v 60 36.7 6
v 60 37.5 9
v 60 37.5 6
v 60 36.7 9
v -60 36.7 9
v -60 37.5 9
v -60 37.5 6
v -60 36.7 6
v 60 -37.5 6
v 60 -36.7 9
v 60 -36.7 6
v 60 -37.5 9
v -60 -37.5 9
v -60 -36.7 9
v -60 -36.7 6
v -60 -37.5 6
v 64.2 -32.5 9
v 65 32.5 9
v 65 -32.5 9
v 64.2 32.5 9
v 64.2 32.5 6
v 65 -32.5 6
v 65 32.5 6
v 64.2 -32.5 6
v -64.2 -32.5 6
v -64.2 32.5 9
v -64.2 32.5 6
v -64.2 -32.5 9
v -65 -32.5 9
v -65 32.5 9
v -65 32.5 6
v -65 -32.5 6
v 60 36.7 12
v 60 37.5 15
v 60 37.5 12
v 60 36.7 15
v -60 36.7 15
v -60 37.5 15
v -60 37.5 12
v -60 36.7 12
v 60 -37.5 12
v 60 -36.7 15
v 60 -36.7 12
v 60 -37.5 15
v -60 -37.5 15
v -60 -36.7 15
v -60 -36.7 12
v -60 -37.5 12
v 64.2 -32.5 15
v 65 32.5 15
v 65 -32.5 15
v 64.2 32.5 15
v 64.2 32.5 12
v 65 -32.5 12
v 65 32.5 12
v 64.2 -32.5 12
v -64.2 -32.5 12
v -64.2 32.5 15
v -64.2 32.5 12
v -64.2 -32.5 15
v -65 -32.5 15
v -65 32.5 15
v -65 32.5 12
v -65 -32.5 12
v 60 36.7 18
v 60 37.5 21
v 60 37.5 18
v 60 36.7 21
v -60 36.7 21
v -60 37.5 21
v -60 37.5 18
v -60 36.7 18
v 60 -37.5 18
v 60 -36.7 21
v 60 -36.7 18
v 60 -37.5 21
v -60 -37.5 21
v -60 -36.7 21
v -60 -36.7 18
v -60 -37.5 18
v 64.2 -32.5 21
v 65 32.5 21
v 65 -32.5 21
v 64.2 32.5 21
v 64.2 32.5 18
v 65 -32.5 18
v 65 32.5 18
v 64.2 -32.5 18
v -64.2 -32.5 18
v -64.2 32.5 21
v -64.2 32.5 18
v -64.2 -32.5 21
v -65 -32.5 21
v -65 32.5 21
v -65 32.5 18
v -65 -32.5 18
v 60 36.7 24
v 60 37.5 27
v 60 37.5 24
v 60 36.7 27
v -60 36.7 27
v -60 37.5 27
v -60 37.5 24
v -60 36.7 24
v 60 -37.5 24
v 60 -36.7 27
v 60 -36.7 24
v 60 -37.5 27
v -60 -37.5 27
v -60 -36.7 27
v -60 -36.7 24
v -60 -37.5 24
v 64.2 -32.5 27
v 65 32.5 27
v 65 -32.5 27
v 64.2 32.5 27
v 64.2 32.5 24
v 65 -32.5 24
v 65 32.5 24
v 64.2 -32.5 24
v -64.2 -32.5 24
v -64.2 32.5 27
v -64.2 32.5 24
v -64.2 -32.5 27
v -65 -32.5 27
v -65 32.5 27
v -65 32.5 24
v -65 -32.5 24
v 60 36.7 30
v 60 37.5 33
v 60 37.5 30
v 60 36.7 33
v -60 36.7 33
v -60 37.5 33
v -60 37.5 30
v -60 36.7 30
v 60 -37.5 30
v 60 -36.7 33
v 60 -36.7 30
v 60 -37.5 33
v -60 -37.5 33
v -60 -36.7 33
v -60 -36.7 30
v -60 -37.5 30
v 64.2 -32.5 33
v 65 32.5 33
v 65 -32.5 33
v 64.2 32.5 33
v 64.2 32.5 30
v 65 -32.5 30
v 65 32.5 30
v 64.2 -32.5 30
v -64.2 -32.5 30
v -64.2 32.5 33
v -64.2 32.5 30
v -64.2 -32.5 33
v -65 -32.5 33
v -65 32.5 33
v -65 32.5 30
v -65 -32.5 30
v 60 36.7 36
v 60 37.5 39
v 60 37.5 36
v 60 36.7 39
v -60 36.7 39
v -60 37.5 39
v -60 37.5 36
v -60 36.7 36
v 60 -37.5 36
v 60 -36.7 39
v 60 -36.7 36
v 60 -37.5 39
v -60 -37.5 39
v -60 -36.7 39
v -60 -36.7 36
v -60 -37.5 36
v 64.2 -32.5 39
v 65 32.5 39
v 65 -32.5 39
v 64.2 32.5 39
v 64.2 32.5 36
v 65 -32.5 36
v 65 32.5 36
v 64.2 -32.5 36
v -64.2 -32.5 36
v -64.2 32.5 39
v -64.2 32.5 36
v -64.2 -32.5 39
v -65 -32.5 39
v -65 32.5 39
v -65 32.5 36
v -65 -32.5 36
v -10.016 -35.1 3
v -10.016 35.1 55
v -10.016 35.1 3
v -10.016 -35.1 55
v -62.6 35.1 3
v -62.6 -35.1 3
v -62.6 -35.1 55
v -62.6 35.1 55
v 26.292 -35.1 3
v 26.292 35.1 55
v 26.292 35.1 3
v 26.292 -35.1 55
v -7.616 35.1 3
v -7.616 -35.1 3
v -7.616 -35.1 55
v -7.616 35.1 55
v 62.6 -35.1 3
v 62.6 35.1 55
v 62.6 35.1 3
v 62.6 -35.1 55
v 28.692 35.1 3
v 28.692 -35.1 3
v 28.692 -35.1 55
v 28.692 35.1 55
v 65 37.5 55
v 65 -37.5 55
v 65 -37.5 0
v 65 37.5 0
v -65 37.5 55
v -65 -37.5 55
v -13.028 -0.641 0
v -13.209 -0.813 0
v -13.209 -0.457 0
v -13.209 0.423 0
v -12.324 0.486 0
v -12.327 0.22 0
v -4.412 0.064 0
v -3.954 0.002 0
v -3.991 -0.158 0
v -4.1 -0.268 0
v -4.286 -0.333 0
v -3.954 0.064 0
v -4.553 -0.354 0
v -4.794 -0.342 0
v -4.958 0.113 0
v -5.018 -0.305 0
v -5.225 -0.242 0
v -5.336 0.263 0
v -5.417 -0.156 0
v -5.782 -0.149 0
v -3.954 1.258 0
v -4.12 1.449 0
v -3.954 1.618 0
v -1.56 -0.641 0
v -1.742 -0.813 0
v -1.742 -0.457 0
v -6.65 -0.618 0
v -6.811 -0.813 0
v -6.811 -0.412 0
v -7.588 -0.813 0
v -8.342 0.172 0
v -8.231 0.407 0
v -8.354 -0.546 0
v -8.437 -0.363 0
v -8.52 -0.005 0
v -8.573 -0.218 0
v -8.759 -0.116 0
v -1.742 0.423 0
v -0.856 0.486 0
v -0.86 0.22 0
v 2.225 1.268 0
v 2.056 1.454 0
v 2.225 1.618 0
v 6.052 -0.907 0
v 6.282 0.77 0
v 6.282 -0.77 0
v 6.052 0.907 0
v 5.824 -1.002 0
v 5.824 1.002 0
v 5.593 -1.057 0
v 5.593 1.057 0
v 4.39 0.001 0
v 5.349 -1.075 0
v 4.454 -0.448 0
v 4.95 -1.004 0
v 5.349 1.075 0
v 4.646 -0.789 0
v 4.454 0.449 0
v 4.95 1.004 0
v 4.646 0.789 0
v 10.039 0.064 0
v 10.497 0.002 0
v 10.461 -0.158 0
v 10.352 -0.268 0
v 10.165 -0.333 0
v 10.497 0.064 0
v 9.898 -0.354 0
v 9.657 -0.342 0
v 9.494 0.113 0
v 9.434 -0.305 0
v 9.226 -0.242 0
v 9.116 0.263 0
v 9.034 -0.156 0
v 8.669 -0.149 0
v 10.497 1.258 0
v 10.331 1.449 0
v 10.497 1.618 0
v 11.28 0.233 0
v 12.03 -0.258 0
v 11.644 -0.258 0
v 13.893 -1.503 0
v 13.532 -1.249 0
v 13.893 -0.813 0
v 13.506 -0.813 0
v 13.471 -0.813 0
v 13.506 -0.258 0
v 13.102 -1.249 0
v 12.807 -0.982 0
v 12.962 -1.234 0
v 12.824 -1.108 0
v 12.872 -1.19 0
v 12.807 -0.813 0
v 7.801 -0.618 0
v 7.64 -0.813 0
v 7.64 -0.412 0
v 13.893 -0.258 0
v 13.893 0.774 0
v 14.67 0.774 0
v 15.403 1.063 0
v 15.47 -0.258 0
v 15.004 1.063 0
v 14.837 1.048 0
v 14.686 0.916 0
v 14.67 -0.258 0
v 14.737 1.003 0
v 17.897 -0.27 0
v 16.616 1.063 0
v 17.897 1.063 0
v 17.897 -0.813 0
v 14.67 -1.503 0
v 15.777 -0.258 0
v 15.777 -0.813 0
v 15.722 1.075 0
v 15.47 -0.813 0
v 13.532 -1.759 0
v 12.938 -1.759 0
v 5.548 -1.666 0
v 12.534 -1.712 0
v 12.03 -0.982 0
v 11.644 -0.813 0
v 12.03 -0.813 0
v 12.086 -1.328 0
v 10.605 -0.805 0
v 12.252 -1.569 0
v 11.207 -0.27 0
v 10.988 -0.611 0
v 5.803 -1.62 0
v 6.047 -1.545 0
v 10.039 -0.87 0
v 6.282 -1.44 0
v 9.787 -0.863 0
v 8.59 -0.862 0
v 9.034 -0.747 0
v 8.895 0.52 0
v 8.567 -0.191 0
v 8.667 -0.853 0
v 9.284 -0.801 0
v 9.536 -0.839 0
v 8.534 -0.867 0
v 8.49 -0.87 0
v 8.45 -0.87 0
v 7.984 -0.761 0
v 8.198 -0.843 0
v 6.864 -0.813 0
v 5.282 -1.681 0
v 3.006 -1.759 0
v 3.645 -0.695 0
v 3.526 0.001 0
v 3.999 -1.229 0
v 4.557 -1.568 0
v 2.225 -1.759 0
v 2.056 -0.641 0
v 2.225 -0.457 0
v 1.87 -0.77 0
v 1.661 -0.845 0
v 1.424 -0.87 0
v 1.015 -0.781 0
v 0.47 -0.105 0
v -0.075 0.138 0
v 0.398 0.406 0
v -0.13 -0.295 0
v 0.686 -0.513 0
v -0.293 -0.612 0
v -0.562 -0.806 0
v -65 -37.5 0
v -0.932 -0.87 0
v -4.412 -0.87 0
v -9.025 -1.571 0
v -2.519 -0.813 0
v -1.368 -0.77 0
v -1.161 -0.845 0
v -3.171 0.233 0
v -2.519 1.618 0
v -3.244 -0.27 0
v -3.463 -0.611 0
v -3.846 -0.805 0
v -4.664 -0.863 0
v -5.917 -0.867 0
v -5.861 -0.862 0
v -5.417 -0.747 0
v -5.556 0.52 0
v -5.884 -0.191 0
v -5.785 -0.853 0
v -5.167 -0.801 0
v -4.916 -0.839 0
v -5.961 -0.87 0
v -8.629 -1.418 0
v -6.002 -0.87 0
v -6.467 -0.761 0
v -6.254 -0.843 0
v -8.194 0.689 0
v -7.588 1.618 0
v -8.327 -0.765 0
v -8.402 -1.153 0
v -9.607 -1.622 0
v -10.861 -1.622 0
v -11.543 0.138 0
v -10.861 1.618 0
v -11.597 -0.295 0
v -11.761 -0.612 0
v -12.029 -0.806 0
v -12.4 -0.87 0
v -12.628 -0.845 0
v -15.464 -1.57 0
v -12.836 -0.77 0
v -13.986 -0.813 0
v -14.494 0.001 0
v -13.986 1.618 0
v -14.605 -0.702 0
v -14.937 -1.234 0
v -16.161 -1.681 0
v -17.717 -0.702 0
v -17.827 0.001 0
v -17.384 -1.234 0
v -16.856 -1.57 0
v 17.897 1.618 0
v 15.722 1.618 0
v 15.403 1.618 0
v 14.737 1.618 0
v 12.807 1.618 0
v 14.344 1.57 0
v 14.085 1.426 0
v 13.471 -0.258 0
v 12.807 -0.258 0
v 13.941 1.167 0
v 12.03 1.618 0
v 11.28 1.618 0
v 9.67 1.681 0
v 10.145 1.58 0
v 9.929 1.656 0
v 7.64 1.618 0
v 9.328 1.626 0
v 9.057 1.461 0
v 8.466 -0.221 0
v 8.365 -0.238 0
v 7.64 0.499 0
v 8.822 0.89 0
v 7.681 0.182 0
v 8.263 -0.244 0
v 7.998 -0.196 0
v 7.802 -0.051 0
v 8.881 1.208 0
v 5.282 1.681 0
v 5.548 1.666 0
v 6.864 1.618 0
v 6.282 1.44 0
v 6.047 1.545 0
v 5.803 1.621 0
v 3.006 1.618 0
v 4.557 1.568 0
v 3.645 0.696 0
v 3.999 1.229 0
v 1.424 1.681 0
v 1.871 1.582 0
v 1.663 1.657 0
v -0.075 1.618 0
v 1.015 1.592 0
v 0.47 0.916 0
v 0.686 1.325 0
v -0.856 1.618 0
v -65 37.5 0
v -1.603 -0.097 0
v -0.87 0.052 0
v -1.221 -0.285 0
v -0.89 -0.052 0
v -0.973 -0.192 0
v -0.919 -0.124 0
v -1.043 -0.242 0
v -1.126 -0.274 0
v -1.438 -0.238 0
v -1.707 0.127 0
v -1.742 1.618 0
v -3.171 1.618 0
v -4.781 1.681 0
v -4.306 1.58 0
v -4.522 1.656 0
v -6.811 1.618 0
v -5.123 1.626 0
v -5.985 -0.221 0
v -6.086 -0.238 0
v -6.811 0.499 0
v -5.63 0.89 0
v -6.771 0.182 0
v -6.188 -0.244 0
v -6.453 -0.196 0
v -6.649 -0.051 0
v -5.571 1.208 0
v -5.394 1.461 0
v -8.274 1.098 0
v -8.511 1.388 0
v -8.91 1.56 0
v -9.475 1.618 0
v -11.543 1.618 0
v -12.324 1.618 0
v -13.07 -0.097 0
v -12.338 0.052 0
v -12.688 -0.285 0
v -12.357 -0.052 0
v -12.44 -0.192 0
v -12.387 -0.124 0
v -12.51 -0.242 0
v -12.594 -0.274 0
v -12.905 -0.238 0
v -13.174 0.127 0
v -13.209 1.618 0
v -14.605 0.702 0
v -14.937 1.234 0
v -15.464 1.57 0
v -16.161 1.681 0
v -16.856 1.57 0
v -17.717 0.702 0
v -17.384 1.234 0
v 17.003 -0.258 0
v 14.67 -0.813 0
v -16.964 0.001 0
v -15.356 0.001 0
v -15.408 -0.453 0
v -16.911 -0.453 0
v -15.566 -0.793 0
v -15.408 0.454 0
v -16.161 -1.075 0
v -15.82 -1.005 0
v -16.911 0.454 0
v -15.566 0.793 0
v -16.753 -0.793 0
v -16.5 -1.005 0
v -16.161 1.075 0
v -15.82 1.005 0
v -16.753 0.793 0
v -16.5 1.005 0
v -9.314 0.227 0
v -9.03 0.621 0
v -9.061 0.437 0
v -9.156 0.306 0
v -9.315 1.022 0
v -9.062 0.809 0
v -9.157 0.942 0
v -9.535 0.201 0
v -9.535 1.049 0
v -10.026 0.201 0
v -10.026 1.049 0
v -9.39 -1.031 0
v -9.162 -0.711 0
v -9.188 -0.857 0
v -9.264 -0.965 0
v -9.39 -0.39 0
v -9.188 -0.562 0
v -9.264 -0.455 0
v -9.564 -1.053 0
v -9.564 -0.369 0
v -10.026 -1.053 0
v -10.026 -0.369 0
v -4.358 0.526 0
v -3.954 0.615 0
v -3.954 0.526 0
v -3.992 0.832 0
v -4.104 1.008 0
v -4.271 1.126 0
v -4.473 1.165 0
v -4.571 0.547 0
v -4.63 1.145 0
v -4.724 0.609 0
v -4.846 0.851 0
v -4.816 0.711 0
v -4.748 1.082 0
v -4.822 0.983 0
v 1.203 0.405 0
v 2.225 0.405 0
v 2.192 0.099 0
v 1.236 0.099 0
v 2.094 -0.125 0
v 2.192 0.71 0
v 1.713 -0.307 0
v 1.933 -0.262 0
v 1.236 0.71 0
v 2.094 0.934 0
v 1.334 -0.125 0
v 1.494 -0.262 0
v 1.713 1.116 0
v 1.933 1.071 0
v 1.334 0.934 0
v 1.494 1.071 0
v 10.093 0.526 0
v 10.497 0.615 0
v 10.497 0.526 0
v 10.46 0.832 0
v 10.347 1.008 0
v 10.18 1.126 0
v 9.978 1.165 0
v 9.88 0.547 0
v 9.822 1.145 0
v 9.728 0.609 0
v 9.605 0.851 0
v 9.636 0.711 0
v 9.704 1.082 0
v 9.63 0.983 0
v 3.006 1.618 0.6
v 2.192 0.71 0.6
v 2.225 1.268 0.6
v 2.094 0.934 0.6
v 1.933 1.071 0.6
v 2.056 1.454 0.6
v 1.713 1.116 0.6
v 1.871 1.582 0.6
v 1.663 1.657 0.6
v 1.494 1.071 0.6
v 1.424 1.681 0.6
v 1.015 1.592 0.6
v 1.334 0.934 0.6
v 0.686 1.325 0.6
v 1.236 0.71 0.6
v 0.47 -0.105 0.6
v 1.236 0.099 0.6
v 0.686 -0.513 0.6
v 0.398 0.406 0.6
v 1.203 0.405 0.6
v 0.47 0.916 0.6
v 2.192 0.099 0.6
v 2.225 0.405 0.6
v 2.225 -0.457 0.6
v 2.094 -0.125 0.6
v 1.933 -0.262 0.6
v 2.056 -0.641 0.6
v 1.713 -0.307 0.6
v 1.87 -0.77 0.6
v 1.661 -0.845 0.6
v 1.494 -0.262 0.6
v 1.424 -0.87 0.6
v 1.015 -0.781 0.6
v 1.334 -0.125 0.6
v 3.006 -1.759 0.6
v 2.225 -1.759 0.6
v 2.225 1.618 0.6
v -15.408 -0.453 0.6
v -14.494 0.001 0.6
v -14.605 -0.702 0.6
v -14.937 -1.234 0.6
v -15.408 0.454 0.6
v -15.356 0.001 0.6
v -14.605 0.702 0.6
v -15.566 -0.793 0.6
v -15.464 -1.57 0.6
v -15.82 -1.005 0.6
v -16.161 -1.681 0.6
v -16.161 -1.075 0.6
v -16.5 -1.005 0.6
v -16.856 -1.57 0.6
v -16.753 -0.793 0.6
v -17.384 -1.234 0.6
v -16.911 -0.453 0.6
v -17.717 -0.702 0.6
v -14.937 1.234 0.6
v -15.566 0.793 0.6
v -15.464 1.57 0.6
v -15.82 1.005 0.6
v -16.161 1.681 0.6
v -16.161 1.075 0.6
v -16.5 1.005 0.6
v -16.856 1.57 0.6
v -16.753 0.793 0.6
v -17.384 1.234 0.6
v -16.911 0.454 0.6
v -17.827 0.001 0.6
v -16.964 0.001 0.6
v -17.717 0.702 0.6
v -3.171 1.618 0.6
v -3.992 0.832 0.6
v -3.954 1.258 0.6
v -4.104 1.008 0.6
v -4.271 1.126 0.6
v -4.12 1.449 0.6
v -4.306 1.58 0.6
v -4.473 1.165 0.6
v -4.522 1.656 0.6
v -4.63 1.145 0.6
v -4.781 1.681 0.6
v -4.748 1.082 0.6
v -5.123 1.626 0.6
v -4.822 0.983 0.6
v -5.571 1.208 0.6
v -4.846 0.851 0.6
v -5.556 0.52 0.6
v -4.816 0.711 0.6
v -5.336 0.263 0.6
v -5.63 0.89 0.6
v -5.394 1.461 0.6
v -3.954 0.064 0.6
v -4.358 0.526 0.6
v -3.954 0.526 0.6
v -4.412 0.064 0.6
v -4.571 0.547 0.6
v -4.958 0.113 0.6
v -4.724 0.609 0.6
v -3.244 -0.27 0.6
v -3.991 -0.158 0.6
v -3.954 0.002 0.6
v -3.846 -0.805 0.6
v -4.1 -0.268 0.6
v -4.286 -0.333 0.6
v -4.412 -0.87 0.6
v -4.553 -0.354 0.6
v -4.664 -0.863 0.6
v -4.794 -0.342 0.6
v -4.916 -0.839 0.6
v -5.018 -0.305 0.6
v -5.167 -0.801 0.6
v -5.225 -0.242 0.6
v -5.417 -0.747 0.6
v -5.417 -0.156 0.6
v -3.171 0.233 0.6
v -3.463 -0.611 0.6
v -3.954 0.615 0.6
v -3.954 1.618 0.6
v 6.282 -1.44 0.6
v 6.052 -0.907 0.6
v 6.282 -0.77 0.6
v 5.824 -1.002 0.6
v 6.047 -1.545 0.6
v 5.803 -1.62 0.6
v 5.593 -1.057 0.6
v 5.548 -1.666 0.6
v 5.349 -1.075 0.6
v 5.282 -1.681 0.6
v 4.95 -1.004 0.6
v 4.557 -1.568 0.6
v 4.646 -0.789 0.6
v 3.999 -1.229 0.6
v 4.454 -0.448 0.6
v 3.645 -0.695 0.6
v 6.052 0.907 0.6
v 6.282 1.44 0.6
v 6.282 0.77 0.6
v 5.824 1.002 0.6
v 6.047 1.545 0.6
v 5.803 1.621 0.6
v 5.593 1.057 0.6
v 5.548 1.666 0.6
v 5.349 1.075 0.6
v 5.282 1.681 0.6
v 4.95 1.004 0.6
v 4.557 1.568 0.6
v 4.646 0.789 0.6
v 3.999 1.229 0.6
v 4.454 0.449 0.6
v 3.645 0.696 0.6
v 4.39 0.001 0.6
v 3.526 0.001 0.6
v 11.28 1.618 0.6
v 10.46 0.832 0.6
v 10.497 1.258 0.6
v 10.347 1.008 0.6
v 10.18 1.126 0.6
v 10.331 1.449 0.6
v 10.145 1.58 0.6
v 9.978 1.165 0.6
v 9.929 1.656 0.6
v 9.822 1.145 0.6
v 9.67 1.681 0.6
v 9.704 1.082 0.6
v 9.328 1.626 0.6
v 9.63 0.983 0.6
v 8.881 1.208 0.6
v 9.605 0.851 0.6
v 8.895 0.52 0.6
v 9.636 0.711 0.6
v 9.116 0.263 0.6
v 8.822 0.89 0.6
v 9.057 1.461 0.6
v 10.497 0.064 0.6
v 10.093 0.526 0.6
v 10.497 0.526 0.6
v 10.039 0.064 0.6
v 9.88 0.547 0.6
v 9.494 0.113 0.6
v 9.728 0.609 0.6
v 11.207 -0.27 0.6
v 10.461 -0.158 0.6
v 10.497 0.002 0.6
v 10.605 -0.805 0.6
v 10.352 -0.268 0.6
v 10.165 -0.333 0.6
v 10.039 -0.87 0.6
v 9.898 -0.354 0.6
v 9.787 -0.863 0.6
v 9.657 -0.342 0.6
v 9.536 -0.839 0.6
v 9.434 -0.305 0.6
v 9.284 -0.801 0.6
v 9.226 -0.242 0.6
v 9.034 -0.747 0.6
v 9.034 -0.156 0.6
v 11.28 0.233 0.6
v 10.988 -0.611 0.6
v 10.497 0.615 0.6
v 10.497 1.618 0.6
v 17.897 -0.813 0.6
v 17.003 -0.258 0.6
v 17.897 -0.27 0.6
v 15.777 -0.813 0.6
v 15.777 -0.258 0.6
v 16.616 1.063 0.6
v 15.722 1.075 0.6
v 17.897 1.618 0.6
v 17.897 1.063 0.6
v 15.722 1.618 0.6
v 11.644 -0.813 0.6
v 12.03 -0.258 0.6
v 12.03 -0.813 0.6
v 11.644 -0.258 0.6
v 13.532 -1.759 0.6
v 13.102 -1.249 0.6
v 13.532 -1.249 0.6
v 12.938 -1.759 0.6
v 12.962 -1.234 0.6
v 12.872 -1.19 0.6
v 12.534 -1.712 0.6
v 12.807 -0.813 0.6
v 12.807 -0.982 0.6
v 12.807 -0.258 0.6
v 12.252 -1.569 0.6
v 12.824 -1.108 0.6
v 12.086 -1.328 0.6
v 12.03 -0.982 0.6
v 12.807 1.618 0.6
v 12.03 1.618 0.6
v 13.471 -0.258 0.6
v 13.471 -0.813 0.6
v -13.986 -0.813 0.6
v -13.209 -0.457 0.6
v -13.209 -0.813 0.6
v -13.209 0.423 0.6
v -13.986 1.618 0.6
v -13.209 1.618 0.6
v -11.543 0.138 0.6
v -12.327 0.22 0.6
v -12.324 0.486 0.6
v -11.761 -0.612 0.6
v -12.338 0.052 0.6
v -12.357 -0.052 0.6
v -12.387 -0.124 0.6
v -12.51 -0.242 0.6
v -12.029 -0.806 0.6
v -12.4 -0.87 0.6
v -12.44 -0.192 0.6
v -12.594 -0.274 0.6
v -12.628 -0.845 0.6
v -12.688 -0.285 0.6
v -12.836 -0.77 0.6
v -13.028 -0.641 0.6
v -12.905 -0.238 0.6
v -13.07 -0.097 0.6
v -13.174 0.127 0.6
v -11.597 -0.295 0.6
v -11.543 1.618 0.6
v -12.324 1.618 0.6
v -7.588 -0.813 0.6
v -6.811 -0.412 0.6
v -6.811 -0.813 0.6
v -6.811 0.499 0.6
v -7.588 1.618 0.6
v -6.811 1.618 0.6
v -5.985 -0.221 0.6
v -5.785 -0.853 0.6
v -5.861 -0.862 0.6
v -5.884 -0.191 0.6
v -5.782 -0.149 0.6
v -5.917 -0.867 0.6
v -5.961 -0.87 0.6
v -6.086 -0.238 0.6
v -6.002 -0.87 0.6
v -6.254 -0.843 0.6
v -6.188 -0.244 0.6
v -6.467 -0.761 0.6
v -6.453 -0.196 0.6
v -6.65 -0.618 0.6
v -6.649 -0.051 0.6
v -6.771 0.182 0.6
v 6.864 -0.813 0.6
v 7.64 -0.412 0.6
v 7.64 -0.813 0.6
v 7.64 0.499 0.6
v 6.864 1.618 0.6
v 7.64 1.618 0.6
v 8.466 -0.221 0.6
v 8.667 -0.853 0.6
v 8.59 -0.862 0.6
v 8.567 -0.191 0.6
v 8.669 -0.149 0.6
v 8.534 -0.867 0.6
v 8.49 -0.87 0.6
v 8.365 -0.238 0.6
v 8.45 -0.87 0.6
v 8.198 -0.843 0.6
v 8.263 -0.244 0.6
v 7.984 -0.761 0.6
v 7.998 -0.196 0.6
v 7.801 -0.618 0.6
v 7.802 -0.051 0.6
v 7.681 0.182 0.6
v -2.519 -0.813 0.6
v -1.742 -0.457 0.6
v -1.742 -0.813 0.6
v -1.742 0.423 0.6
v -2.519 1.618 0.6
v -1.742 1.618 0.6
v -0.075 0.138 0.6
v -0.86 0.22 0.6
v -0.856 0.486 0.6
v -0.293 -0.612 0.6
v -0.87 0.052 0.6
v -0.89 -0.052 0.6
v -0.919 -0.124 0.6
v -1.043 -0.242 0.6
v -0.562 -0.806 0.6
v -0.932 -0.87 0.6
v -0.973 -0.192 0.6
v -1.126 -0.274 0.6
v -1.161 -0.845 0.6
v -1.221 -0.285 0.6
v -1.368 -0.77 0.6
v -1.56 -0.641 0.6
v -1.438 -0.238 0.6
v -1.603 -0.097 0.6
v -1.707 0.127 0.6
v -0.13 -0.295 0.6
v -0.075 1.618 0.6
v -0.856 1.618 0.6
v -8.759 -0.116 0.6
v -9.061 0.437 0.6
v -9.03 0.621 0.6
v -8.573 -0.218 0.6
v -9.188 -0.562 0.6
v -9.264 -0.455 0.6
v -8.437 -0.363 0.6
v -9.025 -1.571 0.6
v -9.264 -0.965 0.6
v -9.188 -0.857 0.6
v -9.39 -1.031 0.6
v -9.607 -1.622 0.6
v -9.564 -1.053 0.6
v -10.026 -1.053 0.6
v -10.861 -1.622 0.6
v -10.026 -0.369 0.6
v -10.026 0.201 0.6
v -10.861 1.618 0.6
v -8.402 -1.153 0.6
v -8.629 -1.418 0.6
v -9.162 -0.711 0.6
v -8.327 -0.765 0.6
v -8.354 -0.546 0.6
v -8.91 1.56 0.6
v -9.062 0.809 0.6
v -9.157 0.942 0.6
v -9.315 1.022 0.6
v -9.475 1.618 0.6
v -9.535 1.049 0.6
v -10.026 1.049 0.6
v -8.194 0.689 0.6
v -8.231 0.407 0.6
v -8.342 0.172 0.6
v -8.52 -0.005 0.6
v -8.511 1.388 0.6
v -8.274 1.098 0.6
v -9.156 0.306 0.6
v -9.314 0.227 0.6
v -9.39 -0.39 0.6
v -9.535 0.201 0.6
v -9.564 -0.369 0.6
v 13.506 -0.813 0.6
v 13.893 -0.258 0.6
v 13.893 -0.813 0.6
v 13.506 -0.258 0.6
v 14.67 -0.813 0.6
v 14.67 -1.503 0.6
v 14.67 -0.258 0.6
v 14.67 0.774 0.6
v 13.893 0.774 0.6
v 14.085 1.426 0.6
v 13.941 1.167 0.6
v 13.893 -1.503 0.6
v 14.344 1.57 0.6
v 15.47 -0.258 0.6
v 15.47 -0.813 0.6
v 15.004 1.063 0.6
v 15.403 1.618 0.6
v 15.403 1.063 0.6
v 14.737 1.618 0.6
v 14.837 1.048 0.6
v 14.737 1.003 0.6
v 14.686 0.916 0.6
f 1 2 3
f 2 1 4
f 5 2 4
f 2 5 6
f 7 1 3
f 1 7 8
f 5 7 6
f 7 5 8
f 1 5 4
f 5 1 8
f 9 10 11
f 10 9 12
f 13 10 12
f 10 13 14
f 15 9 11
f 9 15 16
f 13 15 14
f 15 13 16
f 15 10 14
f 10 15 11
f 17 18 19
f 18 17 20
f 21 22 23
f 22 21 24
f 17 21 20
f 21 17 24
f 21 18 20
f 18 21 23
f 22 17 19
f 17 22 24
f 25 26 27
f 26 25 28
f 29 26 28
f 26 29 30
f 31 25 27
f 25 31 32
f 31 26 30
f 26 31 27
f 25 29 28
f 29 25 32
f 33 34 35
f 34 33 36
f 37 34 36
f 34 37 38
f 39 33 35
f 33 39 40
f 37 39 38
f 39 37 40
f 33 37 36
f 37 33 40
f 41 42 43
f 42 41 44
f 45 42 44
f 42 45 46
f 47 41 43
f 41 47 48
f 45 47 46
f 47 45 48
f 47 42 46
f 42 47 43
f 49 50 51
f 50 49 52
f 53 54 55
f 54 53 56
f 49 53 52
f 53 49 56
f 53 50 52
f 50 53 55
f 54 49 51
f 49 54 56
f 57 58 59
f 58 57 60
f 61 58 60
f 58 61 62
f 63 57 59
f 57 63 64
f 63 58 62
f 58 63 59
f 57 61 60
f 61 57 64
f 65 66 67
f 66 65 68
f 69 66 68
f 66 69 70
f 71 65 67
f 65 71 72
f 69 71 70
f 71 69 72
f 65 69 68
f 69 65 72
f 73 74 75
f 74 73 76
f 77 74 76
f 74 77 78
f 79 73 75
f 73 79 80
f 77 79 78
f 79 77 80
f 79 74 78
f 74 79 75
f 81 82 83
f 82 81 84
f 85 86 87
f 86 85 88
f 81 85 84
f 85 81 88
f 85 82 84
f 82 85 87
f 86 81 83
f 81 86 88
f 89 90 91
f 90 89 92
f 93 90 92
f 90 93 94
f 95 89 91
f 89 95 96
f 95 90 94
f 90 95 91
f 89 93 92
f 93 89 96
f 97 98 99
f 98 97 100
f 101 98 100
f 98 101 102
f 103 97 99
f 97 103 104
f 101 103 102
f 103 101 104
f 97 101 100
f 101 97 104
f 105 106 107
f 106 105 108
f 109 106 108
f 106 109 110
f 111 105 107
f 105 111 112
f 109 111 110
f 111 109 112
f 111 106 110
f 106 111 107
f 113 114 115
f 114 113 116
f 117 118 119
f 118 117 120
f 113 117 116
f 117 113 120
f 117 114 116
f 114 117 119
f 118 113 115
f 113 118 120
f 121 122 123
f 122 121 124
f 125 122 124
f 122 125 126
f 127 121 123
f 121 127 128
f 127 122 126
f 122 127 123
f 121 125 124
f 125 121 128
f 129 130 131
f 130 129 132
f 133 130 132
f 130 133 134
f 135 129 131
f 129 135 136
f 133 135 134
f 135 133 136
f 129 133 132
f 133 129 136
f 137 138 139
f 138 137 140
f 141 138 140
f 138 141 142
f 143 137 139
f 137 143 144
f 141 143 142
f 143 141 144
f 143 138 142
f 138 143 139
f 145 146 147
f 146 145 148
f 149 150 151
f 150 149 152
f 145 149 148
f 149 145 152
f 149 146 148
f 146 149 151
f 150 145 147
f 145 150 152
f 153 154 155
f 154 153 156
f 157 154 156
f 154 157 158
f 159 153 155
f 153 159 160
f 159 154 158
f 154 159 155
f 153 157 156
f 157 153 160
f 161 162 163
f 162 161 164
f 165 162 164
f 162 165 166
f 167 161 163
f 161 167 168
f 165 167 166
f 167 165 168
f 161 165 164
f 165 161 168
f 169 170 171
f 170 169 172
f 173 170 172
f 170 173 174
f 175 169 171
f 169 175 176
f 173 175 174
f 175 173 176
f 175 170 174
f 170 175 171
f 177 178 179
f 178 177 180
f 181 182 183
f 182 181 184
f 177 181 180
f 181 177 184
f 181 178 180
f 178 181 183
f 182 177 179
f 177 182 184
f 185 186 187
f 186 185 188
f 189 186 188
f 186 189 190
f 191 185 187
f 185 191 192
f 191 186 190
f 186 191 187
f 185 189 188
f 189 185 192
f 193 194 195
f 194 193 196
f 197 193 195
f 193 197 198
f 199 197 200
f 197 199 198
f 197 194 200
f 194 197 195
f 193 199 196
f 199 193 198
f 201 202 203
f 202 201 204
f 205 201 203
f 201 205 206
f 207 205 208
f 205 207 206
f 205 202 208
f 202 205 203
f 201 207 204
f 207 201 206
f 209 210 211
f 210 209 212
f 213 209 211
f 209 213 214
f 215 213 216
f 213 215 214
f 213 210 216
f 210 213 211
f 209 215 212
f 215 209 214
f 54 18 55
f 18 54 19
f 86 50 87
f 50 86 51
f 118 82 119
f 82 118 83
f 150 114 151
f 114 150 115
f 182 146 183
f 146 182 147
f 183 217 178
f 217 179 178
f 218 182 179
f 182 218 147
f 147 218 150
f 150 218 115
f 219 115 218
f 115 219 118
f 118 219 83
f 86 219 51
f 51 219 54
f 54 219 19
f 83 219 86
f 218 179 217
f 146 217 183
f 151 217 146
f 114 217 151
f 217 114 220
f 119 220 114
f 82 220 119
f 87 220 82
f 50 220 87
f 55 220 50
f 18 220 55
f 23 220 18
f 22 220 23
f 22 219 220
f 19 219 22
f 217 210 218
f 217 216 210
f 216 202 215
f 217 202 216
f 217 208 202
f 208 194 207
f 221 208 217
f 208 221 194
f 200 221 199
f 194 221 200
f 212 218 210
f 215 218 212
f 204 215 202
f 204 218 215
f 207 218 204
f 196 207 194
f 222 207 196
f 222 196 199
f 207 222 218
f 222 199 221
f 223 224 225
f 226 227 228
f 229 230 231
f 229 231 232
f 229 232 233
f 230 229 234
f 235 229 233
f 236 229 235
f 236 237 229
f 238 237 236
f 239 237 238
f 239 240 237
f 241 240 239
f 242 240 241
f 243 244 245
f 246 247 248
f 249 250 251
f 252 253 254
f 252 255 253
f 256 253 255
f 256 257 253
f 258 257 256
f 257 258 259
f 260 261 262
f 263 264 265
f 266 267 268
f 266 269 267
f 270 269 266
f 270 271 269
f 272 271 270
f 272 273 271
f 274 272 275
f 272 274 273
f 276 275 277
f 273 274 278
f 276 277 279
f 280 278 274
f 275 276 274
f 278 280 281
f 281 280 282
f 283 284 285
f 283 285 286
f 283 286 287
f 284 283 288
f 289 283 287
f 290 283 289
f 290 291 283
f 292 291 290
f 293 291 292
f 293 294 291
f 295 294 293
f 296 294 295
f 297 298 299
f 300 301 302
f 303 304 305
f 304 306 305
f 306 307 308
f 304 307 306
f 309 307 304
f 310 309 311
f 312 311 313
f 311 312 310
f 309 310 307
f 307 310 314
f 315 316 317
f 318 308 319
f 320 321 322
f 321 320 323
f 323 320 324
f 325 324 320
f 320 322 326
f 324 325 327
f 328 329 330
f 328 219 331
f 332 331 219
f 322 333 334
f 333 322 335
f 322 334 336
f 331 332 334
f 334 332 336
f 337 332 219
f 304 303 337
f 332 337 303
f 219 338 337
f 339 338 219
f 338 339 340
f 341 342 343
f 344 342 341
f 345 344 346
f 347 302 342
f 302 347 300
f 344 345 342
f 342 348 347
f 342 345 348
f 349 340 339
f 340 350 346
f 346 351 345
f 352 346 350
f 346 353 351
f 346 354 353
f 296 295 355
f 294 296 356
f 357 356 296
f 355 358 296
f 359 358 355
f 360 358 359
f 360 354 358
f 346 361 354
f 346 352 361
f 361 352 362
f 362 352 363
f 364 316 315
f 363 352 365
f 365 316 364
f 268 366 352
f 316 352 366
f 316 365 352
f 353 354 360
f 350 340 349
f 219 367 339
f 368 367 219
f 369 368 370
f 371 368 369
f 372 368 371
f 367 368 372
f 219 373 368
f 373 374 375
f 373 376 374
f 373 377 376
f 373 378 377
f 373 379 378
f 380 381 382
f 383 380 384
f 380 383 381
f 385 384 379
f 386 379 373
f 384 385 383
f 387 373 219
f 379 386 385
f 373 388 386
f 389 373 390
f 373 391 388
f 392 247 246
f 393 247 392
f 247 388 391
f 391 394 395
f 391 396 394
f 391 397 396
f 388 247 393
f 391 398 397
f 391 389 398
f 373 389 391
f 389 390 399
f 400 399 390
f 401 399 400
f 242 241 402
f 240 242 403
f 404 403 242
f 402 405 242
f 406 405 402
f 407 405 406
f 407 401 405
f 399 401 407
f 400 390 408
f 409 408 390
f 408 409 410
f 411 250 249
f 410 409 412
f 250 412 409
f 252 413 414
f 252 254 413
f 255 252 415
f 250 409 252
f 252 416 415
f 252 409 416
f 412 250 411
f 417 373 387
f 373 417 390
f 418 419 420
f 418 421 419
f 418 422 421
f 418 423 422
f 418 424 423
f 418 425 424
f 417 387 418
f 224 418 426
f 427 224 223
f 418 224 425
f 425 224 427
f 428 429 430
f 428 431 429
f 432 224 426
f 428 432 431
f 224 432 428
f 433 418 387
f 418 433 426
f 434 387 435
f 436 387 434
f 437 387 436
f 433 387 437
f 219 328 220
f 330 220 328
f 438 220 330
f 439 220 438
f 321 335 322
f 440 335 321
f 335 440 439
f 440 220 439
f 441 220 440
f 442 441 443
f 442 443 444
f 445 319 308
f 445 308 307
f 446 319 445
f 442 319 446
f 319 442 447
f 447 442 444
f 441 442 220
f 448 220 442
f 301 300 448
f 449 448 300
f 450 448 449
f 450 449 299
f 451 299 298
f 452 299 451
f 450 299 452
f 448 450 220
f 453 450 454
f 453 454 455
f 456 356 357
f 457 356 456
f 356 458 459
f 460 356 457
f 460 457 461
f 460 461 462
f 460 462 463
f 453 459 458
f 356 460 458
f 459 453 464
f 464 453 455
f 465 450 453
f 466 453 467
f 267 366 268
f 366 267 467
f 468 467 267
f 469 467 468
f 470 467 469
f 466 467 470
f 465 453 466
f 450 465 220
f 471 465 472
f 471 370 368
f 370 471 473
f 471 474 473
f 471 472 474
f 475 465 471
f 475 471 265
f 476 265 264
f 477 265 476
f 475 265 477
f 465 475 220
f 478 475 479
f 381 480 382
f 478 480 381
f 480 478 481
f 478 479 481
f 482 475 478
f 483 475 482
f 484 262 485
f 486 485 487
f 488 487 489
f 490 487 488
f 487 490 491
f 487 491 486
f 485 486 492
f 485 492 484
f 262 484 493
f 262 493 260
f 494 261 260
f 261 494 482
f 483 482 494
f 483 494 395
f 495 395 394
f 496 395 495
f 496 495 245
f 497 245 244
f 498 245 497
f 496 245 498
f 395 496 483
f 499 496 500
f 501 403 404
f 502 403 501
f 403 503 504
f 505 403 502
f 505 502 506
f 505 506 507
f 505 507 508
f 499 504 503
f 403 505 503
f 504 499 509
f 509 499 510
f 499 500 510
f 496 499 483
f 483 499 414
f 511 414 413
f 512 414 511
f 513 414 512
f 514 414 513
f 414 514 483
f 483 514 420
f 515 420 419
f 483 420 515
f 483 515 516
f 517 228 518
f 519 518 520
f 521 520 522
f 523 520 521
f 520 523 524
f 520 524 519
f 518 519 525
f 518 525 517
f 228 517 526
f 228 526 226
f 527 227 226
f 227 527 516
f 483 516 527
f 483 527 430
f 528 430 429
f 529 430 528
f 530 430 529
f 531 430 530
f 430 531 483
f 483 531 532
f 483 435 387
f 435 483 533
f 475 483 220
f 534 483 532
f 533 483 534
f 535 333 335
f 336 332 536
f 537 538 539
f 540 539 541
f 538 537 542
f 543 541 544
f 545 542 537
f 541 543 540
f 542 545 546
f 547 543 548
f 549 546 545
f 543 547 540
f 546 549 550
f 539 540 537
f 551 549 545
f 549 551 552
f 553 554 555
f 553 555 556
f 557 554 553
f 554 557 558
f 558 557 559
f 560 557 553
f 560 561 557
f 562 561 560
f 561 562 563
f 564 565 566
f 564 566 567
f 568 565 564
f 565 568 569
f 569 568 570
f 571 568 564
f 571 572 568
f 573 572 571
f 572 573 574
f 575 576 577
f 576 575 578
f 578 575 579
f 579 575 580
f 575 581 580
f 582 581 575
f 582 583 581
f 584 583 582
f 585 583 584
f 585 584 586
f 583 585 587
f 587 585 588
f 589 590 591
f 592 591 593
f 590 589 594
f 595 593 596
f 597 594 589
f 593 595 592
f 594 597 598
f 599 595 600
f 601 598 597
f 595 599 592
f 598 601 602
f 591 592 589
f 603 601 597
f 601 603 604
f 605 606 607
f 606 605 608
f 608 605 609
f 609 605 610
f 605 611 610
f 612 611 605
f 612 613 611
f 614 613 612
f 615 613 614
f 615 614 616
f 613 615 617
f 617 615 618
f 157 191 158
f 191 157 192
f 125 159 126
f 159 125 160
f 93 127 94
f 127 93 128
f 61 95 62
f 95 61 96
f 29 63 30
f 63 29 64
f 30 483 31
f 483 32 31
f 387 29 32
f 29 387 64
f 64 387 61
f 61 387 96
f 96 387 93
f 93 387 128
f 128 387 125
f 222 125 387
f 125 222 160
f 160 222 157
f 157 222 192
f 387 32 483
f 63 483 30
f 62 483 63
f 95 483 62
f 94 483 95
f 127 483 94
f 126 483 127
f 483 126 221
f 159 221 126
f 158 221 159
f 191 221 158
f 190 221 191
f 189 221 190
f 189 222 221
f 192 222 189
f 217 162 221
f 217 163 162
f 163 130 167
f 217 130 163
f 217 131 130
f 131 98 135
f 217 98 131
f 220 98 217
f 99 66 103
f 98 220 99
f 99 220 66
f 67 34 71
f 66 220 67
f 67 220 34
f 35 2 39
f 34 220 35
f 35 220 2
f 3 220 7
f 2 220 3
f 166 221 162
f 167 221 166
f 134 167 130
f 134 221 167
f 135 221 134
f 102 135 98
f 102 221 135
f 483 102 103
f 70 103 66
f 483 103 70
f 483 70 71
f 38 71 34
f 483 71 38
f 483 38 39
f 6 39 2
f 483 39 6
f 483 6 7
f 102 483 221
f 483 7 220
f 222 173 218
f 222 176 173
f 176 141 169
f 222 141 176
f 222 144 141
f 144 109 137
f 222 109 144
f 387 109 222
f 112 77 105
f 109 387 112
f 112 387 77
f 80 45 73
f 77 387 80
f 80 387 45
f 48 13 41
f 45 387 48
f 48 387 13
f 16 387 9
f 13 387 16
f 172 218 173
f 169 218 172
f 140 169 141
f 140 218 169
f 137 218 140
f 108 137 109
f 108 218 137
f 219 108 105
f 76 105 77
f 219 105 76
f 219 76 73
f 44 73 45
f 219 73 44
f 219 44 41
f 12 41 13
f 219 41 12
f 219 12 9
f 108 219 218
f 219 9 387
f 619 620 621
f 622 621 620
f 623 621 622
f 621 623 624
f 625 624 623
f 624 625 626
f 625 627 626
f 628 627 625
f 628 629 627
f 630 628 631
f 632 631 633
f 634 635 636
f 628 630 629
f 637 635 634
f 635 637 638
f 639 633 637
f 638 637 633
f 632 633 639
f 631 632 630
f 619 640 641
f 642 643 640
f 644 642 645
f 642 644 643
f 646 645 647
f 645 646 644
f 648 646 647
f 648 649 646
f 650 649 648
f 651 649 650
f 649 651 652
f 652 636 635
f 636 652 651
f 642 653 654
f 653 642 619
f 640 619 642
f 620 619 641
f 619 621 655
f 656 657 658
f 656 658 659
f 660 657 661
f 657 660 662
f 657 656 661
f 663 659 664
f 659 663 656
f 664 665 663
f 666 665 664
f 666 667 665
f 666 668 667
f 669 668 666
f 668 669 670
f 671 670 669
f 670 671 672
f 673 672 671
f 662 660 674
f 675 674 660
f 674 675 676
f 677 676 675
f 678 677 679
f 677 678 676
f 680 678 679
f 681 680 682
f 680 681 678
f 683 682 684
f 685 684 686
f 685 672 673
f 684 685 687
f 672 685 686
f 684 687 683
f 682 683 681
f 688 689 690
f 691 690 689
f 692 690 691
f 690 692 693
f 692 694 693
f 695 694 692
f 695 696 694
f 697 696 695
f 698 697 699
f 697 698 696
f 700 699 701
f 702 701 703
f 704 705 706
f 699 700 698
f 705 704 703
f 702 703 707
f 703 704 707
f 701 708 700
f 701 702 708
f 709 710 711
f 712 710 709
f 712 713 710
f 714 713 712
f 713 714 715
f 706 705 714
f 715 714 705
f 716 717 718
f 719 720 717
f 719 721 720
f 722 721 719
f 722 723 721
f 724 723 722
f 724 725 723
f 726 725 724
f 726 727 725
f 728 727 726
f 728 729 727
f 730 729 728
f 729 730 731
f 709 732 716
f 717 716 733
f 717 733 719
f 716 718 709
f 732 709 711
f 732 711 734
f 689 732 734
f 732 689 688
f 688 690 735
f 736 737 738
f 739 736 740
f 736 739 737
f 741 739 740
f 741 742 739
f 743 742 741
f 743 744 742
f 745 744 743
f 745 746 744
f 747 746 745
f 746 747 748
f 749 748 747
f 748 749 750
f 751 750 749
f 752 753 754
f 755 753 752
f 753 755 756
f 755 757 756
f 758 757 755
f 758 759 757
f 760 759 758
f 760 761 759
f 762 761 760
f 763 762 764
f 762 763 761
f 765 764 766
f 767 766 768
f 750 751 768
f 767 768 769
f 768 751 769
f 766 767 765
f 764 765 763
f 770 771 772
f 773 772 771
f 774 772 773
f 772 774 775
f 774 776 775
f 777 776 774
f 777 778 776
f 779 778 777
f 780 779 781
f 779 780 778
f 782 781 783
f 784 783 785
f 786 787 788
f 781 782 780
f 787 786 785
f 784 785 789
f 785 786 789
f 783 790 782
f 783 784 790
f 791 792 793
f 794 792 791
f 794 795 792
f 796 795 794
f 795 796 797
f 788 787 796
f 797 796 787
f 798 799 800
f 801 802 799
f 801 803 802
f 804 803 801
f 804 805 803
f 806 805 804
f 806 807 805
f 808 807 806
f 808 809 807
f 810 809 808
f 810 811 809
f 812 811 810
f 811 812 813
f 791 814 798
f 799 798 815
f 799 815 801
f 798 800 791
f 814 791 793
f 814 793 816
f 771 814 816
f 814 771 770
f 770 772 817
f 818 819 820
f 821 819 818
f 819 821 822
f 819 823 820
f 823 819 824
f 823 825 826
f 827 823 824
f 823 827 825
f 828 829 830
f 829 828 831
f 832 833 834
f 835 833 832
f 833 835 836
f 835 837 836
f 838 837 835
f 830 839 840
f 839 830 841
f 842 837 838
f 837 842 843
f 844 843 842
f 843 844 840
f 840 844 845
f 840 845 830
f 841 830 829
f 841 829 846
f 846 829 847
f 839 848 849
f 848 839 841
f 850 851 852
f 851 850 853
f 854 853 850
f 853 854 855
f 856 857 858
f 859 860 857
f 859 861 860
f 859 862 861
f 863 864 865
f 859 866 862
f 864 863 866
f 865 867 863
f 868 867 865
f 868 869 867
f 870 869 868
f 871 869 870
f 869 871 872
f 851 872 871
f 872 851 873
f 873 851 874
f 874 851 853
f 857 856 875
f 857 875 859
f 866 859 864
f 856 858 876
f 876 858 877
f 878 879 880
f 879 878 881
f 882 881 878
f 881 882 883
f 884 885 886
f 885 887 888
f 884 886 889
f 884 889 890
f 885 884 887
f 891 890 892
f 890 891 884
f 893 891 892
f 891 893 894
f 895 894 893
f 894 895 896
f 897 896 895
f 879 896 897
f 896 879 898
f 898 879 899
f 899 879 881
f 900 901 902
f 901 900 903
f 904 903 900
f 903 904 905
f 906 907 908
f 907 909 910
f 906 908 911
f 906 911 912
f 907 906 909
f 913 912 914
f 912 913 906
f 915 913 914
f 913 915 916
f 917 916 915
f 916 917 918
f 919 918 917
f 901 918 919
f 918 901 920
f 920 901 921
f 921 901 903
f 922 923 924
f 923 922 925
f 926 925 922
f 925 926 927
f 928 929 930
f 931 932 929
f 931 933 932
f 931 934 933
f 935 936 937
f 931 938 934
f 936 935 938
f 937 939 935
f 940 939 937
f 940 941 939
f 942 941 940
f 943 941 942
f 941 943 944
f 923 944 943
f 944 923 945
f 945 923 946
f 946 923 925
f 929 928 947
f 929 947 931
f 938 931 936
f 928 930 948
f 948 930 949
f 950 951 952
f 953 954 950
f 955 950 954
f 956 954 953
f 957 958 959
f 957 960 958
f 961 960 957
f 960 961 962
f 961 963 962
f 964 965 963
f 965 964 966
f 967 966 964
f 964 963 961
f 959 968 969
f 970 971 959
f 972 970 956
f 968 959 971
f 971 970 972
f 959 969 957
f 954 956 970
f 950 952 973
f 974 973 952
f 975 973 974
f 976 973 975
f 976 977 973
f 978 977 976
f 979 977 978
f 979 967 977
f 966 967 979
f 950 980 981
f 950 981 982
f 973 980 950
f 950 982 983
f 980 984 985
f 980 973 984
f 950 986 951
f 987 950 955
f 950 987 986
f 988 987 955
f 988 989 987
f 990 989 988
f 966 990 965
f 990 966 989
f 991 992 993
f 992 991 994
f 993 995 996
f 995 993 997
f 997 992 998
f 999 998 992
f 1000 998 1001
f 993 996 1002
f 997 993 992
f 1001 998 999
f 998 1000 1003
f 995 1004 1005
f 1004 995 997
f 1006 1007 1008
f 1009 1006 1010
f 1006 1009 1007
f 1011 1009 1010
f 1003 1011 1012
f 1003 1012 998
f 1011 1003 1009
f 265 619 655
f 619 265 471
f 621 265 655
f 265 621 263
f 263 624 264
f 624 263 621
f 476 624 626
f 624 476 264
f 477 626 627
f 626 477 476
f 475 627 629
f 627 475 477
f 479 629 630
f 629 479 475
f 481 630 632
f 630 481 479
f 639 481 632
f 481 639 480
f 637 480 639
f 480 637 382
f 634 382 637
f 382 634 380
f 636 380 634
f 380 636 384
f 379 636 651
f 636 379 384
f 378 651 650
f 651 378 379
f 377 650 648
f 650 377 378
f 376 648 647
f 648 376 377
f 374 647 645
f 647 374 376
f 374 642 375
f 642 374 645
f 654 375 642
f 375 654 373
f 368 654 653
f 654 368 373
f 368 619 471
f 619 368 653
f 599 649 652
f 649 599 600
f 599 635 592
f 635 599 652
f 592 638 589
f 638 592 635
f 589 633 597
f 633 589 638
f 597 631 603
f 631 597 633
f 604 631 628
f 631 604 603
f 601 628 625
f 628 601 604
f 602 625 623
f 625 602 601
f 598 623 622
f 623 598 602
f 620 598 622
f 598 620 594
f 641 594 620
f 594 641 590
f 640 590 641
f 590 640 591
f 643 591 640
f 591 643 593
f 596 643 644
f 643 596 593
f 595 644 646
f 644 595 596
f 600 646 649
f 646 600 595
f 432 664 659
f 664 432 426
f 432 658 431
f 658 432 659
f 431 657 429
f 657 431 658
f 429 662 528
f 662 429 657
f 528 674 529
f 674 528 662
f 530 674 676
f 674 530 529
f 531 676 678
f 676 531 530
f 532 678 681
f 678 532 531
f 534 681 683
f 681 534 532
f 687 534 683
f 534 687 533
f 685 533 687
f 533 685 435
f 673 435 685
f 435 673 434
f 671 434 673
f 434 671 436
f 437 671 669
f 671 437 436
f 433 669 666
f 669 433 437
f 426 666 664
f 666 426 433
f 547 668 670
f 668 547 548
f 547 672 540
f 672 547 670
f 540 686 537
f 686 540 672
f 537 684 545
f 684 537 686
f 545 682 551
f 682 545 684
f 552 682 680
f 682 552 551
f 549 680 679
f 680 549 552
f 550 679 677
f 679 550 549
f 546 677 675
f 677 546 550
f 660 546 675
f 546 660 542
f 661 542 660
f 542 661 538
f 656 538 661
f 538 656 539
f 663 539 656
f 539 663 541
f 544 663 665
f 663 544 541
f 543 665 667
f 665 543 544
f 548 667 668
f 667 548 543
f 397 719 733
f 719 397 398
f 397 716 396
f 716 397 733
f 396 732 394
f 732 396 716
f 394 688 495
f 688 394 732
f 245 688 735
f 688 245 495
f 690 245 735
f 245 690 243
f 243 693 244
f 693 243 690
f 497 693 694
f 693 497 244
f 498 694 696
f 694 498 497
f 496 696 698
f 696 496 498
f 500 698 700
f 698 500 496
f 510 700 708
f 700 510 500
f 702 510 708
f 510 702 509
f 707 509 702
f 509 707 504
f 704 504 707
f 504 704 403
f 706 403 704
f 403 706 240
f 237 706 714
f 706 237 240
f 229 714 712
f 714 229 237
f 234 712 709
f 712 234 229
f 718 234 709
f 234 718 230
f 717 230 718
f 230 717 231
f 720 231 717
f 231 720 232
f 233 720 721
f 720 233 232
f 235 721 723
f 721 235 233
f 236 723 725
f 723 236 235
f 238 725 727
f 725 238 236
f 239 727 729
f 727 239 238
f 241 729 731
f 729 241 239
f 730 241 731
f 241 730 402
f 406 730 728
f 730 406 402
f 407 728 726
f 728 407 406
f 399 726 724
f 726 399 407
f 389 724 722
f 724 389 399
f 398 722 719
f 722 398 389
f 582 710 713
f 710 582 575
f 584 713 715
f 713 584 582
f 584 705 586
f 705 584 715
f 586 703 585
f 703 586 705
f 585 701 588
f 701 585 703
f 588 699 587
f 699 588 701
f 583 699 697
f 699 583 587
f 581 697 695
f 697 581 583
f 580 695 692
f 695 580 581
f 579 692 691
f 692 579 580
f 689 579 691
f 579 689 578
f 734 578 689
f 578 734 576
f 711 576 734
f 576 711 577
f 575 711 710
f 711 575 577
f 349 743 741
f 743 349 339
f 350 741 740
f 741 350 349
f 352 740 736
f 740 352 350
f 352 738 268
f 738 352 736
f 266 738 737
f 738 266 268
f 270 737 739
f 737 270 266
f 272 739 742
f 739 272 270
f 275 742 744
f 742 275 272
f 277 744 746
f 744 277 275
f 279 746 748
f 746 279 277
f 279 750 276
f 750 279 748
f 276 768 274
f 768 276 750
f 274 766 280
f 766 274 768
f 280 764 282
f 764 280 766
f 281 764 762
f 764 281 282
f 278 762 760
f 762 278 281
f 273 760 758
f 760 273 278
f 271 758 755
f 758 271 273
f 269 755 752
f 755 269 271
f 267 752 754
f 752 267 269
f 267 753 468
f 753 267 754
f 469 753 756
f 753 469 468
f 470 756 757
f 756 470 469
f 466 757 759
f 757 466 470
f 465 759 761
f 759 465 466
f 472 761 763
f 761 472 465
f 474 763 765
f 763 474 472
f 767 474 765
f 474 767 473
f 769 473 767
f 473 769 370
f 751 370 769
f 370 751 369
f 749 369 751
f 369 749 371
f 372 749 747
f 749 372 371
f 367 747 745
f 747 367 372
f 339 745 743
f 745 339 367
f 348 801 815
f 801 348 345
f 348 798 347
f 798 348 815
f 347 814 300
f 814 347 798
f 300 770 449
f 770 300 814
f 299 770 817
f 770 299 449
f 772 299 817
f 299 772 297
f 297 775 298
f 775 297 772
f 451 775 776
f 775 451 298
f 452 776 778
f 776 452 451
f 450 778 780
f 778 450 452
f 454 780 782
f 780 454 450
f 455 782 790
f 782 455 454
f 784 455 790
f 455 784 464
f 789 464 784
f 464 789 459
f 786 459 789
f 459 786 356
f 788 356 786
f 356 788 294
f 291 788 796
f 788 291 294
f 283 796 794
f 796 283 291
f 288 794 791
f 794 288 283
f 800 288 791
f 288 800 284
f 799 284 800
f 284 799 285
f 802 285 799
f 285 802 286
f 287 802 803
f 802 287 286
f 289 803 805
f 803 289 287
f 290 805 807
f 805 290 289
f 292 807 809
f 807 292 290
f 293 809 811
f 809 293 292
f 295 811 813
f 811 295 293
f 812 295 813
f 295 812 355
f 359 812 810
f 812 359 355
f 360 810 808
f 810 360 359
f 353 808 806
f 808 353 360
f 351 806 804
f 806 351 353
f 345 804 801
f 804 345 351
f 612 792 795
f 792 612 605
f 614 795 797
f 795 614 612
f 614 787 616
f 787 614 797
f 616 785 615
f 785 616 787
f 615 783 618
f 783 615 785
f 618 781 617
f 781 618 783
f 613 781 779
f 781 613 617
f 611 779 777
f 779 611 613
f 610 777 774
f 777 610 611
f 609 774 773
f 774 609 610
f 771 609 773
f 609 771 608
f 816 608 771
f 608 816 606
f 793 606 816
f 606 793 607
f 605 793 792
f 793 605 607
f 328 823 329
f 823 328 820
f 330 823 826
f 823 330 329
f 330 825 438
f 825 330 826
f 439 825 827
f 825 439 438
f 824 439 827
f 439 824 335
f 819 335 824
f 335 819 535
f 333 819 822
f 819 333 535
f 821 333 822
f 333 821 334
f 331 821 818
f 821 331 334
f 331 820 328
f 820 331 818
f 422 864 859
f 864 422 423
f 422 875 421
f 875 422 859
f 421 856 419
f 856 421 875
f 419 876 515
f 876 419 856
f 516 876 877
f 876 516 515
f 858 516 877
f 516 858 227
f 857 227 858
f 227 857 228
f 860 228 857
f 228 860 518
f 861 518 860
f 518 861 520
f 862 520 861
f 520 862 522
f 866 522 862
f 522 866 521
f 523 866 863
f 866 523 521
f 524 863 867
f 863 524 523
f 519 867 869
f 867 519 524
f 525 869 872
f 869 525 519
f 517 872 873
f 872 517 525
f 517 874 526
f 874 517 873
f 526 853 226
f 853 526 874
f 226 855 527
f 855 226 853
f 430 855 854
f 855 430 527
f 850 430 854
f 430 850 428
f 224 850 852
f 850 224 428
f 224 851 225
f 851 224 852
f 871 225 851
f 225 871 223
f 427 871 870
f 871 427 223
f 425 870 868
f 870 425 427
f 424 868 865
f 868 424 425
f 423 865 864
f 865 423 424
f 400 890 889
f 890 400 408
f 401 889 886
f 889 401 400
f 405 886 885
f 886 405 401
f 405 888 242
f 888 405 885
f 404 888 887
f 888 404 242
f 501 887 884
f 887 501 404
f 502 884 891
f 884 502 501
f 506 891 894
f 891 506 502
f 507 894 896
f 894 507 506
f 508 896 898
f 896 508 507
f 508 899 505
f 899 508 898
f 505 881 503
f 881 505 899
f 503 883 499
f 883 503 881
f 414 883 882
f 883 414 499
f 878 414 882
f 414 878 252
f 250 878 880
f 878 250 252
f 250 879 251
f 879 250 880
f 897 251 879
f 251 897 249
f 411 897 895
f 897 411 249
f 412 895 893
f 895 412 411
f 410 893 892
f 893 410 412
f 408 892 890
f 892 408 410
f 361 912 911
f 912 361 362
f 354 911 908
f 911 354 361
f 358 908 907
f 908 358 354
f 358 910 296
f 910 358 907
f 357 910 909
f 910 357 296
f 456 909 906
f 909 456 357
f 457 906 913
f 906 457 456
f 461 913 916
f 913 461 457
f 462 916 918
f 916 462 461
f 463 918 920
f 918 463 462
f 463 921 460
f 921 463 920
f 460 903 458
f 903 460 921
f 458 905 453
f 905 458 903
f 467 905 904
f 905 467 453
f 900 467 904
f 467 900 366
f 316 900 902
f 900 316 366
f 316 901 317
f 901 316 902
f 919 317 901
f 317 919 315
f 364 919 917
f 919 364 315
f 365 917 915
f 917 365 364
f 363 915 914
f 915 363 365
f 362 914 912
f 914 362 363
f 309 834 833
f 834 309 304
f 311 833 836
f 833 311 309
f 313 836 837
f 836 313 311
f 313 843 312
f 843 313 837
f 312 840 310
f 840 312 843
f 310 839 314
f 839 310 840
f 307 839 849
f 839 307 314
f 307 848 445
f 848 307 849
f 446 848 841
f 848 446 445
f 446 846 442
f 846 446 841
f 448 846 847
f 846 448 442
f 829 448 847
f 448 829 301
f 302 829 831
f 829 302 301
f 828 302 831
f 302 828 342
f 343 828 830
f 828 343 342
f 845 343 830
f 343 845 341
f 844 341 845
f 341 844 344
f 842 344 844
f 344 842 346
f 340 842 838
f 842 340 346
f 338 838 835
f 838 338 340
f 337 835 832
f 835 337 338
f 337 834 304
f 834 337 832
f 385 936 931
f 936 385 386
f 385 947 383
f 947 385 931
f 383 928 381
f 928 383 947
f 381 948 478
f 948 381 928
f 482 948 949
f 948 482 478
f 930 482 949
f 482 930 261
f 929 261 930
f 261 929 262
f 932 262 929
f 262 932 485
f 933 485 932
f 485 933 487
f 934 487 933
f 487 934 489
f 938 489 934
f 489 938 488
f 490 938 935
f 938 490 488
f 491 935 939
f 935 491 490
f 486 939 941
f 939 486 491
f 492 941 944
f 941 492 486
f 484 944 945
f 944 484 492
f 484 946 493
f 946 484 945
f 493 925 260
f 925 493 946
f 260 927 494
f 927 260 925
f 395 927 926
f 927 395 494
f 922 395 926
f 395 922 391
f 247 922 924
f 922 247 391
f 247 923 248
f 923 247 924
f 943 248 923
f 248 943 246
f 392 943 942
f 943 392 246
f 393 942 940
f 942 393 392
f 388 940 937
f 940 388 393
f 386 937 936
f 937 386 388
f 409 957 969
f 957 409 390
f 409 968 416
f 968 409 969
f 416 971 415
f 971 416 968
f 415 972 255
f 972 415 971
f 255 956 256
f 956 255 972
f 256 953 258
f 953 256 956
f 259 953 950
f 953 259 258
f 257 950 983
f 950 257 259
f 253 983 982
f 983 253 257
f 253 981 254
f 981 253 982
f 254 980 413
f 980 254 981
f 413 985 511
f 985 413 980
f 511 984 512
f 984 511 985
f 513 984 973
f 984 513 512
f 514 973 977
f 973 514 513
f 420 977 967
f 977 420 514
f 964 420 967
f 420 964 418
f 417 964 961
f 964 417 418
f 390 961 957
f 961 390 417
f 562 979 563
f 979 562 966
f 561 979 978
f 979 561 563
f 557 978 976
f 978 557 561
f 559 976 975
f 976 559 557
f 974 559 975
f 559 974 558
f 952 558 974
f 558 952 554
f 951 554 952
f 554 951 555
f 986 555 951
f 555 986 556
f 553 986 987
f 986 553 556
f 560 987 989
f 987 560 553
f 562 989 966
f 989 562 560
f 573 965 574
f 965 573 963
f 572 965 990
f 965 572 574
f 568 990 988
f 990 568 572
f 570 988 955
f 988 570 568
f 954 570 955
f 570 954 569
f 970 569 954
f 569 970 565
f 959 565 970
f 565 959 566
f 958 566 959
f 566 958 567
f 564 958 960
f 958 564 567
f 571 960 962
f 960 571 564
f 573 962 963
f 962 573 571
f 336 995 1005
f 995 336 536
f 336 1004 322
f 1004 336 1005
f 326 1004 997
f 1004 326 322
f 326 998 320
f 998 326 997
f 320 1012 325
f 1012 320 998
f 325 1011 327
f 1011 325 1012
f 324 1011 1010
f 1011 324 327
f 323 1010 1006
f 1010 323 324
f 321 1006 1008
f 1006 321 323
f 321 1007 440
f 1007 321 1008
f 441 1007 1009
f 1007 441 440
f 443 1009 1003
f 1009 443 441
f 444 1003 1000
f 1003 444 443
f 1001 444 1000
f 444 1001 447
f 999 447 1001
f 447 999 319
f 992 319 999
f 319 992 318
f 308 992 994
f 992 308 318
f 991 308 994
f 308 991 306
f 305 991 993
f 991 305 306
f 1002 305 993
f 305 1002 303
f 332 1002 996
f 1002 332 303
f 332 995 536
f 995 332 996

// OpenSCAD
// file: BOSL2/std.scad
// Minimal BOSL2 compatibility shim for bundled gallery models.
// It implements only the helpers used by the imported OpenSCAD projects.

CENTER = [0, 0, 0];
BOTTOM = [0, 0, -1];
TOP = [0, 0, 1];
LEFT = [-1, 0, 0];
RIGHT = [1, 0, 0];
FRONT = [0, -1, 0];
BACK = [0, 1, 0];

module up(z=0) {
    translate([0, 0, z]) children();
}

module down(z=0) {
    translate([0, 0, -z]) children();
}

module attach(anchor=CENTER) {
    children();
}

module cuboid(size=[1, 1, 1], anchor=CENTER) {
    center = anchor == CENTER;
    translate(center ? [0, 0, 0] : [0, 0, size[2] / 2])
        cube(size, center=true);
    children();
}

module xcyl(h=1, r=1, anchor=CENTER) {
    center = anchor == CENTER;
    translate(center ? [0, 0, 0] : [h / 2, 0, 0])
        rotate([0, 90, 0])
            cylinder(h=h, r=r, center=true);
}
// main file
include <BOSL2/std.scad>

// ============================================================
// Ribbed 3-compartment desk organizer/caddy -- Scott's own recorded
// reference idea (Bambu Handy screen recording, 2026-08-27): horizontal
// corrugated ridges wrapping the exterior of a multi-compartment holder.
// No moving parts -- reuses Technique 2's proven rounded-solid pattern.
// ============================================================

size      = [130, 75, 55];   // outer W x D x H
wall      = 2.4;
floor     = 3;
corner_r  = 5;
n_bays    = 3;

// Ribs: horizontal grooves cut into the FLAT exterior walls. Since the
// walls are flat (not curved like the vase/pumpkin), this needs none of
// Technique 5's skin()-loft machinery -- a plain repeated groove cutter
// on each flat face is sufficient and far simpler.
rib_depth = 0.8;   // absolute mm, well under `wall` (2.4mm) at every point --
                    // same wall-thickness-margin discipline as Technique 5,
                    // just trivial to satisfy here since walls don't taper
rib_pitch = 6;
rib_h     = 3;      // groove height (Z)
rib_margin_top    = 8;   // keep ribs clear of the rim
rib_margin_bottom = 6;   // keep ribs clear of the floor

module outer_shell() {
    cuboid(size, rounding = corner_r, edges = "Z", anchor = BOTTOM);
}

// One shallow groove cutter PER FACE, at a given Z -- each cutter is a
// thin slab straddling just that one face's surface (1mm proud outside
// for a clean cut + rib_depth into the material), spanning only the
// FLAT run of that face (excluding the rounded corners, same "flat faces
// only" discipline Technique 21 established for hex lattices). A first
// draft here mistakenly used a cutter with FULL width on one axis and
// reduced width on the other, intending an "inset from front/back" belt
// -- that actually cuts a full slab through BOTH side walls at every rib
// height, nearly severing the whole shell, since a solid box removes
// everything inside its bounding volume, not just the outer skin. Fixed
// by keeping each face's cutter thin (rib_depth) in the direction
// PERPENDICULAR to that face and full-flat-width in the other two axes.
module rib_grooves() {
    n_ribs = floor((size.z - rib_margin_top - rib_margin_bottom) / rib_pitch);
    flat_x = size.x - 2 * corner_r;
    flat_y = size.y - 2 * corner_r;
    for (i = [0:n_ribs-1]) {
        z = rib_margin_bottom + i * rib_pitch;
        translate([-flat_x/2, size.y/2 - rib_depth, z])
            cube([flat_x, rib_depth + 1, rib_h]);                 // front
        translate([-flat_x/2, -size.y/2 - 1, z])
            cube([flat_x, rib_depth + 1, rib_h]);                 // back
        translate([size.x/2 - rib_depth, -flat_y/2, z])
            cube([rib_depth + 1, flat_y, rib_h]);                 // right
        translate([-size.x/2 - 1, -flat_y/2, z])
            cube([rib_depth + 1, flat_y, rib_h]);                 // left
    }
}

// Bay layout: 3 compartments, the LEFT one wider (matches the Kumiko
// pen-holder precedent's "slant/differentiate bays for real use," here
// simplified to "one wide bay for bulky items, two narrow for pens/clips").
bay_gap   = wall;
usable_w  = size.x - wall * 2;
wide_w    = usable_w * 0.42;
narrow_w  = (usable_w - wide_w - bay_gap * 2) / 2;
bay_d     = size.y - wall * 2;
bay_r     = max(corner_r - wall, 1.5);

function bay_x(i) =
    let(left_edge = -size.x/2 + wall)
    i == 0 ? left_edge + wide_w/2 :
    i == 1 ? left_edge + wide_w + bay_gap + narrow_w/2 :
             left_edge + wide_w + bay_gap*2 + narrow_w + narrow_w/2;
function bay_w(i) = i == 0 ? wide_w : narrow_w;

module bay_cutters() {
    for (i = [0:n_bays-1])
        translate([bay_x(i), 0, floor])
            cuboid([bay_w(i), bay_d, size.z], rounding = bay_r, edges = "Z", anchor = BOTTOM);
}

logo_depth = 0.6;
// Fitted from the start: bottom face is 130x75mm, target well under half
// the shorter usable run (~75mm) -- verified numerically below.
logo_size = 3.2;
module brand_mark() {
    translate([0, 0, -0.5])
        linear_extrude(height = logo_depth + 0.5)
            mirror([0, 1, 0])
                text("OnBrandCraftz", size = logo_size, font = "Dancing Script:style=Bold",
                     halign = "center", valign = "center");
}

difference() {
    outer_shell();
    rib_grooves();
    bay_cutters();
    brand_mark();
}
